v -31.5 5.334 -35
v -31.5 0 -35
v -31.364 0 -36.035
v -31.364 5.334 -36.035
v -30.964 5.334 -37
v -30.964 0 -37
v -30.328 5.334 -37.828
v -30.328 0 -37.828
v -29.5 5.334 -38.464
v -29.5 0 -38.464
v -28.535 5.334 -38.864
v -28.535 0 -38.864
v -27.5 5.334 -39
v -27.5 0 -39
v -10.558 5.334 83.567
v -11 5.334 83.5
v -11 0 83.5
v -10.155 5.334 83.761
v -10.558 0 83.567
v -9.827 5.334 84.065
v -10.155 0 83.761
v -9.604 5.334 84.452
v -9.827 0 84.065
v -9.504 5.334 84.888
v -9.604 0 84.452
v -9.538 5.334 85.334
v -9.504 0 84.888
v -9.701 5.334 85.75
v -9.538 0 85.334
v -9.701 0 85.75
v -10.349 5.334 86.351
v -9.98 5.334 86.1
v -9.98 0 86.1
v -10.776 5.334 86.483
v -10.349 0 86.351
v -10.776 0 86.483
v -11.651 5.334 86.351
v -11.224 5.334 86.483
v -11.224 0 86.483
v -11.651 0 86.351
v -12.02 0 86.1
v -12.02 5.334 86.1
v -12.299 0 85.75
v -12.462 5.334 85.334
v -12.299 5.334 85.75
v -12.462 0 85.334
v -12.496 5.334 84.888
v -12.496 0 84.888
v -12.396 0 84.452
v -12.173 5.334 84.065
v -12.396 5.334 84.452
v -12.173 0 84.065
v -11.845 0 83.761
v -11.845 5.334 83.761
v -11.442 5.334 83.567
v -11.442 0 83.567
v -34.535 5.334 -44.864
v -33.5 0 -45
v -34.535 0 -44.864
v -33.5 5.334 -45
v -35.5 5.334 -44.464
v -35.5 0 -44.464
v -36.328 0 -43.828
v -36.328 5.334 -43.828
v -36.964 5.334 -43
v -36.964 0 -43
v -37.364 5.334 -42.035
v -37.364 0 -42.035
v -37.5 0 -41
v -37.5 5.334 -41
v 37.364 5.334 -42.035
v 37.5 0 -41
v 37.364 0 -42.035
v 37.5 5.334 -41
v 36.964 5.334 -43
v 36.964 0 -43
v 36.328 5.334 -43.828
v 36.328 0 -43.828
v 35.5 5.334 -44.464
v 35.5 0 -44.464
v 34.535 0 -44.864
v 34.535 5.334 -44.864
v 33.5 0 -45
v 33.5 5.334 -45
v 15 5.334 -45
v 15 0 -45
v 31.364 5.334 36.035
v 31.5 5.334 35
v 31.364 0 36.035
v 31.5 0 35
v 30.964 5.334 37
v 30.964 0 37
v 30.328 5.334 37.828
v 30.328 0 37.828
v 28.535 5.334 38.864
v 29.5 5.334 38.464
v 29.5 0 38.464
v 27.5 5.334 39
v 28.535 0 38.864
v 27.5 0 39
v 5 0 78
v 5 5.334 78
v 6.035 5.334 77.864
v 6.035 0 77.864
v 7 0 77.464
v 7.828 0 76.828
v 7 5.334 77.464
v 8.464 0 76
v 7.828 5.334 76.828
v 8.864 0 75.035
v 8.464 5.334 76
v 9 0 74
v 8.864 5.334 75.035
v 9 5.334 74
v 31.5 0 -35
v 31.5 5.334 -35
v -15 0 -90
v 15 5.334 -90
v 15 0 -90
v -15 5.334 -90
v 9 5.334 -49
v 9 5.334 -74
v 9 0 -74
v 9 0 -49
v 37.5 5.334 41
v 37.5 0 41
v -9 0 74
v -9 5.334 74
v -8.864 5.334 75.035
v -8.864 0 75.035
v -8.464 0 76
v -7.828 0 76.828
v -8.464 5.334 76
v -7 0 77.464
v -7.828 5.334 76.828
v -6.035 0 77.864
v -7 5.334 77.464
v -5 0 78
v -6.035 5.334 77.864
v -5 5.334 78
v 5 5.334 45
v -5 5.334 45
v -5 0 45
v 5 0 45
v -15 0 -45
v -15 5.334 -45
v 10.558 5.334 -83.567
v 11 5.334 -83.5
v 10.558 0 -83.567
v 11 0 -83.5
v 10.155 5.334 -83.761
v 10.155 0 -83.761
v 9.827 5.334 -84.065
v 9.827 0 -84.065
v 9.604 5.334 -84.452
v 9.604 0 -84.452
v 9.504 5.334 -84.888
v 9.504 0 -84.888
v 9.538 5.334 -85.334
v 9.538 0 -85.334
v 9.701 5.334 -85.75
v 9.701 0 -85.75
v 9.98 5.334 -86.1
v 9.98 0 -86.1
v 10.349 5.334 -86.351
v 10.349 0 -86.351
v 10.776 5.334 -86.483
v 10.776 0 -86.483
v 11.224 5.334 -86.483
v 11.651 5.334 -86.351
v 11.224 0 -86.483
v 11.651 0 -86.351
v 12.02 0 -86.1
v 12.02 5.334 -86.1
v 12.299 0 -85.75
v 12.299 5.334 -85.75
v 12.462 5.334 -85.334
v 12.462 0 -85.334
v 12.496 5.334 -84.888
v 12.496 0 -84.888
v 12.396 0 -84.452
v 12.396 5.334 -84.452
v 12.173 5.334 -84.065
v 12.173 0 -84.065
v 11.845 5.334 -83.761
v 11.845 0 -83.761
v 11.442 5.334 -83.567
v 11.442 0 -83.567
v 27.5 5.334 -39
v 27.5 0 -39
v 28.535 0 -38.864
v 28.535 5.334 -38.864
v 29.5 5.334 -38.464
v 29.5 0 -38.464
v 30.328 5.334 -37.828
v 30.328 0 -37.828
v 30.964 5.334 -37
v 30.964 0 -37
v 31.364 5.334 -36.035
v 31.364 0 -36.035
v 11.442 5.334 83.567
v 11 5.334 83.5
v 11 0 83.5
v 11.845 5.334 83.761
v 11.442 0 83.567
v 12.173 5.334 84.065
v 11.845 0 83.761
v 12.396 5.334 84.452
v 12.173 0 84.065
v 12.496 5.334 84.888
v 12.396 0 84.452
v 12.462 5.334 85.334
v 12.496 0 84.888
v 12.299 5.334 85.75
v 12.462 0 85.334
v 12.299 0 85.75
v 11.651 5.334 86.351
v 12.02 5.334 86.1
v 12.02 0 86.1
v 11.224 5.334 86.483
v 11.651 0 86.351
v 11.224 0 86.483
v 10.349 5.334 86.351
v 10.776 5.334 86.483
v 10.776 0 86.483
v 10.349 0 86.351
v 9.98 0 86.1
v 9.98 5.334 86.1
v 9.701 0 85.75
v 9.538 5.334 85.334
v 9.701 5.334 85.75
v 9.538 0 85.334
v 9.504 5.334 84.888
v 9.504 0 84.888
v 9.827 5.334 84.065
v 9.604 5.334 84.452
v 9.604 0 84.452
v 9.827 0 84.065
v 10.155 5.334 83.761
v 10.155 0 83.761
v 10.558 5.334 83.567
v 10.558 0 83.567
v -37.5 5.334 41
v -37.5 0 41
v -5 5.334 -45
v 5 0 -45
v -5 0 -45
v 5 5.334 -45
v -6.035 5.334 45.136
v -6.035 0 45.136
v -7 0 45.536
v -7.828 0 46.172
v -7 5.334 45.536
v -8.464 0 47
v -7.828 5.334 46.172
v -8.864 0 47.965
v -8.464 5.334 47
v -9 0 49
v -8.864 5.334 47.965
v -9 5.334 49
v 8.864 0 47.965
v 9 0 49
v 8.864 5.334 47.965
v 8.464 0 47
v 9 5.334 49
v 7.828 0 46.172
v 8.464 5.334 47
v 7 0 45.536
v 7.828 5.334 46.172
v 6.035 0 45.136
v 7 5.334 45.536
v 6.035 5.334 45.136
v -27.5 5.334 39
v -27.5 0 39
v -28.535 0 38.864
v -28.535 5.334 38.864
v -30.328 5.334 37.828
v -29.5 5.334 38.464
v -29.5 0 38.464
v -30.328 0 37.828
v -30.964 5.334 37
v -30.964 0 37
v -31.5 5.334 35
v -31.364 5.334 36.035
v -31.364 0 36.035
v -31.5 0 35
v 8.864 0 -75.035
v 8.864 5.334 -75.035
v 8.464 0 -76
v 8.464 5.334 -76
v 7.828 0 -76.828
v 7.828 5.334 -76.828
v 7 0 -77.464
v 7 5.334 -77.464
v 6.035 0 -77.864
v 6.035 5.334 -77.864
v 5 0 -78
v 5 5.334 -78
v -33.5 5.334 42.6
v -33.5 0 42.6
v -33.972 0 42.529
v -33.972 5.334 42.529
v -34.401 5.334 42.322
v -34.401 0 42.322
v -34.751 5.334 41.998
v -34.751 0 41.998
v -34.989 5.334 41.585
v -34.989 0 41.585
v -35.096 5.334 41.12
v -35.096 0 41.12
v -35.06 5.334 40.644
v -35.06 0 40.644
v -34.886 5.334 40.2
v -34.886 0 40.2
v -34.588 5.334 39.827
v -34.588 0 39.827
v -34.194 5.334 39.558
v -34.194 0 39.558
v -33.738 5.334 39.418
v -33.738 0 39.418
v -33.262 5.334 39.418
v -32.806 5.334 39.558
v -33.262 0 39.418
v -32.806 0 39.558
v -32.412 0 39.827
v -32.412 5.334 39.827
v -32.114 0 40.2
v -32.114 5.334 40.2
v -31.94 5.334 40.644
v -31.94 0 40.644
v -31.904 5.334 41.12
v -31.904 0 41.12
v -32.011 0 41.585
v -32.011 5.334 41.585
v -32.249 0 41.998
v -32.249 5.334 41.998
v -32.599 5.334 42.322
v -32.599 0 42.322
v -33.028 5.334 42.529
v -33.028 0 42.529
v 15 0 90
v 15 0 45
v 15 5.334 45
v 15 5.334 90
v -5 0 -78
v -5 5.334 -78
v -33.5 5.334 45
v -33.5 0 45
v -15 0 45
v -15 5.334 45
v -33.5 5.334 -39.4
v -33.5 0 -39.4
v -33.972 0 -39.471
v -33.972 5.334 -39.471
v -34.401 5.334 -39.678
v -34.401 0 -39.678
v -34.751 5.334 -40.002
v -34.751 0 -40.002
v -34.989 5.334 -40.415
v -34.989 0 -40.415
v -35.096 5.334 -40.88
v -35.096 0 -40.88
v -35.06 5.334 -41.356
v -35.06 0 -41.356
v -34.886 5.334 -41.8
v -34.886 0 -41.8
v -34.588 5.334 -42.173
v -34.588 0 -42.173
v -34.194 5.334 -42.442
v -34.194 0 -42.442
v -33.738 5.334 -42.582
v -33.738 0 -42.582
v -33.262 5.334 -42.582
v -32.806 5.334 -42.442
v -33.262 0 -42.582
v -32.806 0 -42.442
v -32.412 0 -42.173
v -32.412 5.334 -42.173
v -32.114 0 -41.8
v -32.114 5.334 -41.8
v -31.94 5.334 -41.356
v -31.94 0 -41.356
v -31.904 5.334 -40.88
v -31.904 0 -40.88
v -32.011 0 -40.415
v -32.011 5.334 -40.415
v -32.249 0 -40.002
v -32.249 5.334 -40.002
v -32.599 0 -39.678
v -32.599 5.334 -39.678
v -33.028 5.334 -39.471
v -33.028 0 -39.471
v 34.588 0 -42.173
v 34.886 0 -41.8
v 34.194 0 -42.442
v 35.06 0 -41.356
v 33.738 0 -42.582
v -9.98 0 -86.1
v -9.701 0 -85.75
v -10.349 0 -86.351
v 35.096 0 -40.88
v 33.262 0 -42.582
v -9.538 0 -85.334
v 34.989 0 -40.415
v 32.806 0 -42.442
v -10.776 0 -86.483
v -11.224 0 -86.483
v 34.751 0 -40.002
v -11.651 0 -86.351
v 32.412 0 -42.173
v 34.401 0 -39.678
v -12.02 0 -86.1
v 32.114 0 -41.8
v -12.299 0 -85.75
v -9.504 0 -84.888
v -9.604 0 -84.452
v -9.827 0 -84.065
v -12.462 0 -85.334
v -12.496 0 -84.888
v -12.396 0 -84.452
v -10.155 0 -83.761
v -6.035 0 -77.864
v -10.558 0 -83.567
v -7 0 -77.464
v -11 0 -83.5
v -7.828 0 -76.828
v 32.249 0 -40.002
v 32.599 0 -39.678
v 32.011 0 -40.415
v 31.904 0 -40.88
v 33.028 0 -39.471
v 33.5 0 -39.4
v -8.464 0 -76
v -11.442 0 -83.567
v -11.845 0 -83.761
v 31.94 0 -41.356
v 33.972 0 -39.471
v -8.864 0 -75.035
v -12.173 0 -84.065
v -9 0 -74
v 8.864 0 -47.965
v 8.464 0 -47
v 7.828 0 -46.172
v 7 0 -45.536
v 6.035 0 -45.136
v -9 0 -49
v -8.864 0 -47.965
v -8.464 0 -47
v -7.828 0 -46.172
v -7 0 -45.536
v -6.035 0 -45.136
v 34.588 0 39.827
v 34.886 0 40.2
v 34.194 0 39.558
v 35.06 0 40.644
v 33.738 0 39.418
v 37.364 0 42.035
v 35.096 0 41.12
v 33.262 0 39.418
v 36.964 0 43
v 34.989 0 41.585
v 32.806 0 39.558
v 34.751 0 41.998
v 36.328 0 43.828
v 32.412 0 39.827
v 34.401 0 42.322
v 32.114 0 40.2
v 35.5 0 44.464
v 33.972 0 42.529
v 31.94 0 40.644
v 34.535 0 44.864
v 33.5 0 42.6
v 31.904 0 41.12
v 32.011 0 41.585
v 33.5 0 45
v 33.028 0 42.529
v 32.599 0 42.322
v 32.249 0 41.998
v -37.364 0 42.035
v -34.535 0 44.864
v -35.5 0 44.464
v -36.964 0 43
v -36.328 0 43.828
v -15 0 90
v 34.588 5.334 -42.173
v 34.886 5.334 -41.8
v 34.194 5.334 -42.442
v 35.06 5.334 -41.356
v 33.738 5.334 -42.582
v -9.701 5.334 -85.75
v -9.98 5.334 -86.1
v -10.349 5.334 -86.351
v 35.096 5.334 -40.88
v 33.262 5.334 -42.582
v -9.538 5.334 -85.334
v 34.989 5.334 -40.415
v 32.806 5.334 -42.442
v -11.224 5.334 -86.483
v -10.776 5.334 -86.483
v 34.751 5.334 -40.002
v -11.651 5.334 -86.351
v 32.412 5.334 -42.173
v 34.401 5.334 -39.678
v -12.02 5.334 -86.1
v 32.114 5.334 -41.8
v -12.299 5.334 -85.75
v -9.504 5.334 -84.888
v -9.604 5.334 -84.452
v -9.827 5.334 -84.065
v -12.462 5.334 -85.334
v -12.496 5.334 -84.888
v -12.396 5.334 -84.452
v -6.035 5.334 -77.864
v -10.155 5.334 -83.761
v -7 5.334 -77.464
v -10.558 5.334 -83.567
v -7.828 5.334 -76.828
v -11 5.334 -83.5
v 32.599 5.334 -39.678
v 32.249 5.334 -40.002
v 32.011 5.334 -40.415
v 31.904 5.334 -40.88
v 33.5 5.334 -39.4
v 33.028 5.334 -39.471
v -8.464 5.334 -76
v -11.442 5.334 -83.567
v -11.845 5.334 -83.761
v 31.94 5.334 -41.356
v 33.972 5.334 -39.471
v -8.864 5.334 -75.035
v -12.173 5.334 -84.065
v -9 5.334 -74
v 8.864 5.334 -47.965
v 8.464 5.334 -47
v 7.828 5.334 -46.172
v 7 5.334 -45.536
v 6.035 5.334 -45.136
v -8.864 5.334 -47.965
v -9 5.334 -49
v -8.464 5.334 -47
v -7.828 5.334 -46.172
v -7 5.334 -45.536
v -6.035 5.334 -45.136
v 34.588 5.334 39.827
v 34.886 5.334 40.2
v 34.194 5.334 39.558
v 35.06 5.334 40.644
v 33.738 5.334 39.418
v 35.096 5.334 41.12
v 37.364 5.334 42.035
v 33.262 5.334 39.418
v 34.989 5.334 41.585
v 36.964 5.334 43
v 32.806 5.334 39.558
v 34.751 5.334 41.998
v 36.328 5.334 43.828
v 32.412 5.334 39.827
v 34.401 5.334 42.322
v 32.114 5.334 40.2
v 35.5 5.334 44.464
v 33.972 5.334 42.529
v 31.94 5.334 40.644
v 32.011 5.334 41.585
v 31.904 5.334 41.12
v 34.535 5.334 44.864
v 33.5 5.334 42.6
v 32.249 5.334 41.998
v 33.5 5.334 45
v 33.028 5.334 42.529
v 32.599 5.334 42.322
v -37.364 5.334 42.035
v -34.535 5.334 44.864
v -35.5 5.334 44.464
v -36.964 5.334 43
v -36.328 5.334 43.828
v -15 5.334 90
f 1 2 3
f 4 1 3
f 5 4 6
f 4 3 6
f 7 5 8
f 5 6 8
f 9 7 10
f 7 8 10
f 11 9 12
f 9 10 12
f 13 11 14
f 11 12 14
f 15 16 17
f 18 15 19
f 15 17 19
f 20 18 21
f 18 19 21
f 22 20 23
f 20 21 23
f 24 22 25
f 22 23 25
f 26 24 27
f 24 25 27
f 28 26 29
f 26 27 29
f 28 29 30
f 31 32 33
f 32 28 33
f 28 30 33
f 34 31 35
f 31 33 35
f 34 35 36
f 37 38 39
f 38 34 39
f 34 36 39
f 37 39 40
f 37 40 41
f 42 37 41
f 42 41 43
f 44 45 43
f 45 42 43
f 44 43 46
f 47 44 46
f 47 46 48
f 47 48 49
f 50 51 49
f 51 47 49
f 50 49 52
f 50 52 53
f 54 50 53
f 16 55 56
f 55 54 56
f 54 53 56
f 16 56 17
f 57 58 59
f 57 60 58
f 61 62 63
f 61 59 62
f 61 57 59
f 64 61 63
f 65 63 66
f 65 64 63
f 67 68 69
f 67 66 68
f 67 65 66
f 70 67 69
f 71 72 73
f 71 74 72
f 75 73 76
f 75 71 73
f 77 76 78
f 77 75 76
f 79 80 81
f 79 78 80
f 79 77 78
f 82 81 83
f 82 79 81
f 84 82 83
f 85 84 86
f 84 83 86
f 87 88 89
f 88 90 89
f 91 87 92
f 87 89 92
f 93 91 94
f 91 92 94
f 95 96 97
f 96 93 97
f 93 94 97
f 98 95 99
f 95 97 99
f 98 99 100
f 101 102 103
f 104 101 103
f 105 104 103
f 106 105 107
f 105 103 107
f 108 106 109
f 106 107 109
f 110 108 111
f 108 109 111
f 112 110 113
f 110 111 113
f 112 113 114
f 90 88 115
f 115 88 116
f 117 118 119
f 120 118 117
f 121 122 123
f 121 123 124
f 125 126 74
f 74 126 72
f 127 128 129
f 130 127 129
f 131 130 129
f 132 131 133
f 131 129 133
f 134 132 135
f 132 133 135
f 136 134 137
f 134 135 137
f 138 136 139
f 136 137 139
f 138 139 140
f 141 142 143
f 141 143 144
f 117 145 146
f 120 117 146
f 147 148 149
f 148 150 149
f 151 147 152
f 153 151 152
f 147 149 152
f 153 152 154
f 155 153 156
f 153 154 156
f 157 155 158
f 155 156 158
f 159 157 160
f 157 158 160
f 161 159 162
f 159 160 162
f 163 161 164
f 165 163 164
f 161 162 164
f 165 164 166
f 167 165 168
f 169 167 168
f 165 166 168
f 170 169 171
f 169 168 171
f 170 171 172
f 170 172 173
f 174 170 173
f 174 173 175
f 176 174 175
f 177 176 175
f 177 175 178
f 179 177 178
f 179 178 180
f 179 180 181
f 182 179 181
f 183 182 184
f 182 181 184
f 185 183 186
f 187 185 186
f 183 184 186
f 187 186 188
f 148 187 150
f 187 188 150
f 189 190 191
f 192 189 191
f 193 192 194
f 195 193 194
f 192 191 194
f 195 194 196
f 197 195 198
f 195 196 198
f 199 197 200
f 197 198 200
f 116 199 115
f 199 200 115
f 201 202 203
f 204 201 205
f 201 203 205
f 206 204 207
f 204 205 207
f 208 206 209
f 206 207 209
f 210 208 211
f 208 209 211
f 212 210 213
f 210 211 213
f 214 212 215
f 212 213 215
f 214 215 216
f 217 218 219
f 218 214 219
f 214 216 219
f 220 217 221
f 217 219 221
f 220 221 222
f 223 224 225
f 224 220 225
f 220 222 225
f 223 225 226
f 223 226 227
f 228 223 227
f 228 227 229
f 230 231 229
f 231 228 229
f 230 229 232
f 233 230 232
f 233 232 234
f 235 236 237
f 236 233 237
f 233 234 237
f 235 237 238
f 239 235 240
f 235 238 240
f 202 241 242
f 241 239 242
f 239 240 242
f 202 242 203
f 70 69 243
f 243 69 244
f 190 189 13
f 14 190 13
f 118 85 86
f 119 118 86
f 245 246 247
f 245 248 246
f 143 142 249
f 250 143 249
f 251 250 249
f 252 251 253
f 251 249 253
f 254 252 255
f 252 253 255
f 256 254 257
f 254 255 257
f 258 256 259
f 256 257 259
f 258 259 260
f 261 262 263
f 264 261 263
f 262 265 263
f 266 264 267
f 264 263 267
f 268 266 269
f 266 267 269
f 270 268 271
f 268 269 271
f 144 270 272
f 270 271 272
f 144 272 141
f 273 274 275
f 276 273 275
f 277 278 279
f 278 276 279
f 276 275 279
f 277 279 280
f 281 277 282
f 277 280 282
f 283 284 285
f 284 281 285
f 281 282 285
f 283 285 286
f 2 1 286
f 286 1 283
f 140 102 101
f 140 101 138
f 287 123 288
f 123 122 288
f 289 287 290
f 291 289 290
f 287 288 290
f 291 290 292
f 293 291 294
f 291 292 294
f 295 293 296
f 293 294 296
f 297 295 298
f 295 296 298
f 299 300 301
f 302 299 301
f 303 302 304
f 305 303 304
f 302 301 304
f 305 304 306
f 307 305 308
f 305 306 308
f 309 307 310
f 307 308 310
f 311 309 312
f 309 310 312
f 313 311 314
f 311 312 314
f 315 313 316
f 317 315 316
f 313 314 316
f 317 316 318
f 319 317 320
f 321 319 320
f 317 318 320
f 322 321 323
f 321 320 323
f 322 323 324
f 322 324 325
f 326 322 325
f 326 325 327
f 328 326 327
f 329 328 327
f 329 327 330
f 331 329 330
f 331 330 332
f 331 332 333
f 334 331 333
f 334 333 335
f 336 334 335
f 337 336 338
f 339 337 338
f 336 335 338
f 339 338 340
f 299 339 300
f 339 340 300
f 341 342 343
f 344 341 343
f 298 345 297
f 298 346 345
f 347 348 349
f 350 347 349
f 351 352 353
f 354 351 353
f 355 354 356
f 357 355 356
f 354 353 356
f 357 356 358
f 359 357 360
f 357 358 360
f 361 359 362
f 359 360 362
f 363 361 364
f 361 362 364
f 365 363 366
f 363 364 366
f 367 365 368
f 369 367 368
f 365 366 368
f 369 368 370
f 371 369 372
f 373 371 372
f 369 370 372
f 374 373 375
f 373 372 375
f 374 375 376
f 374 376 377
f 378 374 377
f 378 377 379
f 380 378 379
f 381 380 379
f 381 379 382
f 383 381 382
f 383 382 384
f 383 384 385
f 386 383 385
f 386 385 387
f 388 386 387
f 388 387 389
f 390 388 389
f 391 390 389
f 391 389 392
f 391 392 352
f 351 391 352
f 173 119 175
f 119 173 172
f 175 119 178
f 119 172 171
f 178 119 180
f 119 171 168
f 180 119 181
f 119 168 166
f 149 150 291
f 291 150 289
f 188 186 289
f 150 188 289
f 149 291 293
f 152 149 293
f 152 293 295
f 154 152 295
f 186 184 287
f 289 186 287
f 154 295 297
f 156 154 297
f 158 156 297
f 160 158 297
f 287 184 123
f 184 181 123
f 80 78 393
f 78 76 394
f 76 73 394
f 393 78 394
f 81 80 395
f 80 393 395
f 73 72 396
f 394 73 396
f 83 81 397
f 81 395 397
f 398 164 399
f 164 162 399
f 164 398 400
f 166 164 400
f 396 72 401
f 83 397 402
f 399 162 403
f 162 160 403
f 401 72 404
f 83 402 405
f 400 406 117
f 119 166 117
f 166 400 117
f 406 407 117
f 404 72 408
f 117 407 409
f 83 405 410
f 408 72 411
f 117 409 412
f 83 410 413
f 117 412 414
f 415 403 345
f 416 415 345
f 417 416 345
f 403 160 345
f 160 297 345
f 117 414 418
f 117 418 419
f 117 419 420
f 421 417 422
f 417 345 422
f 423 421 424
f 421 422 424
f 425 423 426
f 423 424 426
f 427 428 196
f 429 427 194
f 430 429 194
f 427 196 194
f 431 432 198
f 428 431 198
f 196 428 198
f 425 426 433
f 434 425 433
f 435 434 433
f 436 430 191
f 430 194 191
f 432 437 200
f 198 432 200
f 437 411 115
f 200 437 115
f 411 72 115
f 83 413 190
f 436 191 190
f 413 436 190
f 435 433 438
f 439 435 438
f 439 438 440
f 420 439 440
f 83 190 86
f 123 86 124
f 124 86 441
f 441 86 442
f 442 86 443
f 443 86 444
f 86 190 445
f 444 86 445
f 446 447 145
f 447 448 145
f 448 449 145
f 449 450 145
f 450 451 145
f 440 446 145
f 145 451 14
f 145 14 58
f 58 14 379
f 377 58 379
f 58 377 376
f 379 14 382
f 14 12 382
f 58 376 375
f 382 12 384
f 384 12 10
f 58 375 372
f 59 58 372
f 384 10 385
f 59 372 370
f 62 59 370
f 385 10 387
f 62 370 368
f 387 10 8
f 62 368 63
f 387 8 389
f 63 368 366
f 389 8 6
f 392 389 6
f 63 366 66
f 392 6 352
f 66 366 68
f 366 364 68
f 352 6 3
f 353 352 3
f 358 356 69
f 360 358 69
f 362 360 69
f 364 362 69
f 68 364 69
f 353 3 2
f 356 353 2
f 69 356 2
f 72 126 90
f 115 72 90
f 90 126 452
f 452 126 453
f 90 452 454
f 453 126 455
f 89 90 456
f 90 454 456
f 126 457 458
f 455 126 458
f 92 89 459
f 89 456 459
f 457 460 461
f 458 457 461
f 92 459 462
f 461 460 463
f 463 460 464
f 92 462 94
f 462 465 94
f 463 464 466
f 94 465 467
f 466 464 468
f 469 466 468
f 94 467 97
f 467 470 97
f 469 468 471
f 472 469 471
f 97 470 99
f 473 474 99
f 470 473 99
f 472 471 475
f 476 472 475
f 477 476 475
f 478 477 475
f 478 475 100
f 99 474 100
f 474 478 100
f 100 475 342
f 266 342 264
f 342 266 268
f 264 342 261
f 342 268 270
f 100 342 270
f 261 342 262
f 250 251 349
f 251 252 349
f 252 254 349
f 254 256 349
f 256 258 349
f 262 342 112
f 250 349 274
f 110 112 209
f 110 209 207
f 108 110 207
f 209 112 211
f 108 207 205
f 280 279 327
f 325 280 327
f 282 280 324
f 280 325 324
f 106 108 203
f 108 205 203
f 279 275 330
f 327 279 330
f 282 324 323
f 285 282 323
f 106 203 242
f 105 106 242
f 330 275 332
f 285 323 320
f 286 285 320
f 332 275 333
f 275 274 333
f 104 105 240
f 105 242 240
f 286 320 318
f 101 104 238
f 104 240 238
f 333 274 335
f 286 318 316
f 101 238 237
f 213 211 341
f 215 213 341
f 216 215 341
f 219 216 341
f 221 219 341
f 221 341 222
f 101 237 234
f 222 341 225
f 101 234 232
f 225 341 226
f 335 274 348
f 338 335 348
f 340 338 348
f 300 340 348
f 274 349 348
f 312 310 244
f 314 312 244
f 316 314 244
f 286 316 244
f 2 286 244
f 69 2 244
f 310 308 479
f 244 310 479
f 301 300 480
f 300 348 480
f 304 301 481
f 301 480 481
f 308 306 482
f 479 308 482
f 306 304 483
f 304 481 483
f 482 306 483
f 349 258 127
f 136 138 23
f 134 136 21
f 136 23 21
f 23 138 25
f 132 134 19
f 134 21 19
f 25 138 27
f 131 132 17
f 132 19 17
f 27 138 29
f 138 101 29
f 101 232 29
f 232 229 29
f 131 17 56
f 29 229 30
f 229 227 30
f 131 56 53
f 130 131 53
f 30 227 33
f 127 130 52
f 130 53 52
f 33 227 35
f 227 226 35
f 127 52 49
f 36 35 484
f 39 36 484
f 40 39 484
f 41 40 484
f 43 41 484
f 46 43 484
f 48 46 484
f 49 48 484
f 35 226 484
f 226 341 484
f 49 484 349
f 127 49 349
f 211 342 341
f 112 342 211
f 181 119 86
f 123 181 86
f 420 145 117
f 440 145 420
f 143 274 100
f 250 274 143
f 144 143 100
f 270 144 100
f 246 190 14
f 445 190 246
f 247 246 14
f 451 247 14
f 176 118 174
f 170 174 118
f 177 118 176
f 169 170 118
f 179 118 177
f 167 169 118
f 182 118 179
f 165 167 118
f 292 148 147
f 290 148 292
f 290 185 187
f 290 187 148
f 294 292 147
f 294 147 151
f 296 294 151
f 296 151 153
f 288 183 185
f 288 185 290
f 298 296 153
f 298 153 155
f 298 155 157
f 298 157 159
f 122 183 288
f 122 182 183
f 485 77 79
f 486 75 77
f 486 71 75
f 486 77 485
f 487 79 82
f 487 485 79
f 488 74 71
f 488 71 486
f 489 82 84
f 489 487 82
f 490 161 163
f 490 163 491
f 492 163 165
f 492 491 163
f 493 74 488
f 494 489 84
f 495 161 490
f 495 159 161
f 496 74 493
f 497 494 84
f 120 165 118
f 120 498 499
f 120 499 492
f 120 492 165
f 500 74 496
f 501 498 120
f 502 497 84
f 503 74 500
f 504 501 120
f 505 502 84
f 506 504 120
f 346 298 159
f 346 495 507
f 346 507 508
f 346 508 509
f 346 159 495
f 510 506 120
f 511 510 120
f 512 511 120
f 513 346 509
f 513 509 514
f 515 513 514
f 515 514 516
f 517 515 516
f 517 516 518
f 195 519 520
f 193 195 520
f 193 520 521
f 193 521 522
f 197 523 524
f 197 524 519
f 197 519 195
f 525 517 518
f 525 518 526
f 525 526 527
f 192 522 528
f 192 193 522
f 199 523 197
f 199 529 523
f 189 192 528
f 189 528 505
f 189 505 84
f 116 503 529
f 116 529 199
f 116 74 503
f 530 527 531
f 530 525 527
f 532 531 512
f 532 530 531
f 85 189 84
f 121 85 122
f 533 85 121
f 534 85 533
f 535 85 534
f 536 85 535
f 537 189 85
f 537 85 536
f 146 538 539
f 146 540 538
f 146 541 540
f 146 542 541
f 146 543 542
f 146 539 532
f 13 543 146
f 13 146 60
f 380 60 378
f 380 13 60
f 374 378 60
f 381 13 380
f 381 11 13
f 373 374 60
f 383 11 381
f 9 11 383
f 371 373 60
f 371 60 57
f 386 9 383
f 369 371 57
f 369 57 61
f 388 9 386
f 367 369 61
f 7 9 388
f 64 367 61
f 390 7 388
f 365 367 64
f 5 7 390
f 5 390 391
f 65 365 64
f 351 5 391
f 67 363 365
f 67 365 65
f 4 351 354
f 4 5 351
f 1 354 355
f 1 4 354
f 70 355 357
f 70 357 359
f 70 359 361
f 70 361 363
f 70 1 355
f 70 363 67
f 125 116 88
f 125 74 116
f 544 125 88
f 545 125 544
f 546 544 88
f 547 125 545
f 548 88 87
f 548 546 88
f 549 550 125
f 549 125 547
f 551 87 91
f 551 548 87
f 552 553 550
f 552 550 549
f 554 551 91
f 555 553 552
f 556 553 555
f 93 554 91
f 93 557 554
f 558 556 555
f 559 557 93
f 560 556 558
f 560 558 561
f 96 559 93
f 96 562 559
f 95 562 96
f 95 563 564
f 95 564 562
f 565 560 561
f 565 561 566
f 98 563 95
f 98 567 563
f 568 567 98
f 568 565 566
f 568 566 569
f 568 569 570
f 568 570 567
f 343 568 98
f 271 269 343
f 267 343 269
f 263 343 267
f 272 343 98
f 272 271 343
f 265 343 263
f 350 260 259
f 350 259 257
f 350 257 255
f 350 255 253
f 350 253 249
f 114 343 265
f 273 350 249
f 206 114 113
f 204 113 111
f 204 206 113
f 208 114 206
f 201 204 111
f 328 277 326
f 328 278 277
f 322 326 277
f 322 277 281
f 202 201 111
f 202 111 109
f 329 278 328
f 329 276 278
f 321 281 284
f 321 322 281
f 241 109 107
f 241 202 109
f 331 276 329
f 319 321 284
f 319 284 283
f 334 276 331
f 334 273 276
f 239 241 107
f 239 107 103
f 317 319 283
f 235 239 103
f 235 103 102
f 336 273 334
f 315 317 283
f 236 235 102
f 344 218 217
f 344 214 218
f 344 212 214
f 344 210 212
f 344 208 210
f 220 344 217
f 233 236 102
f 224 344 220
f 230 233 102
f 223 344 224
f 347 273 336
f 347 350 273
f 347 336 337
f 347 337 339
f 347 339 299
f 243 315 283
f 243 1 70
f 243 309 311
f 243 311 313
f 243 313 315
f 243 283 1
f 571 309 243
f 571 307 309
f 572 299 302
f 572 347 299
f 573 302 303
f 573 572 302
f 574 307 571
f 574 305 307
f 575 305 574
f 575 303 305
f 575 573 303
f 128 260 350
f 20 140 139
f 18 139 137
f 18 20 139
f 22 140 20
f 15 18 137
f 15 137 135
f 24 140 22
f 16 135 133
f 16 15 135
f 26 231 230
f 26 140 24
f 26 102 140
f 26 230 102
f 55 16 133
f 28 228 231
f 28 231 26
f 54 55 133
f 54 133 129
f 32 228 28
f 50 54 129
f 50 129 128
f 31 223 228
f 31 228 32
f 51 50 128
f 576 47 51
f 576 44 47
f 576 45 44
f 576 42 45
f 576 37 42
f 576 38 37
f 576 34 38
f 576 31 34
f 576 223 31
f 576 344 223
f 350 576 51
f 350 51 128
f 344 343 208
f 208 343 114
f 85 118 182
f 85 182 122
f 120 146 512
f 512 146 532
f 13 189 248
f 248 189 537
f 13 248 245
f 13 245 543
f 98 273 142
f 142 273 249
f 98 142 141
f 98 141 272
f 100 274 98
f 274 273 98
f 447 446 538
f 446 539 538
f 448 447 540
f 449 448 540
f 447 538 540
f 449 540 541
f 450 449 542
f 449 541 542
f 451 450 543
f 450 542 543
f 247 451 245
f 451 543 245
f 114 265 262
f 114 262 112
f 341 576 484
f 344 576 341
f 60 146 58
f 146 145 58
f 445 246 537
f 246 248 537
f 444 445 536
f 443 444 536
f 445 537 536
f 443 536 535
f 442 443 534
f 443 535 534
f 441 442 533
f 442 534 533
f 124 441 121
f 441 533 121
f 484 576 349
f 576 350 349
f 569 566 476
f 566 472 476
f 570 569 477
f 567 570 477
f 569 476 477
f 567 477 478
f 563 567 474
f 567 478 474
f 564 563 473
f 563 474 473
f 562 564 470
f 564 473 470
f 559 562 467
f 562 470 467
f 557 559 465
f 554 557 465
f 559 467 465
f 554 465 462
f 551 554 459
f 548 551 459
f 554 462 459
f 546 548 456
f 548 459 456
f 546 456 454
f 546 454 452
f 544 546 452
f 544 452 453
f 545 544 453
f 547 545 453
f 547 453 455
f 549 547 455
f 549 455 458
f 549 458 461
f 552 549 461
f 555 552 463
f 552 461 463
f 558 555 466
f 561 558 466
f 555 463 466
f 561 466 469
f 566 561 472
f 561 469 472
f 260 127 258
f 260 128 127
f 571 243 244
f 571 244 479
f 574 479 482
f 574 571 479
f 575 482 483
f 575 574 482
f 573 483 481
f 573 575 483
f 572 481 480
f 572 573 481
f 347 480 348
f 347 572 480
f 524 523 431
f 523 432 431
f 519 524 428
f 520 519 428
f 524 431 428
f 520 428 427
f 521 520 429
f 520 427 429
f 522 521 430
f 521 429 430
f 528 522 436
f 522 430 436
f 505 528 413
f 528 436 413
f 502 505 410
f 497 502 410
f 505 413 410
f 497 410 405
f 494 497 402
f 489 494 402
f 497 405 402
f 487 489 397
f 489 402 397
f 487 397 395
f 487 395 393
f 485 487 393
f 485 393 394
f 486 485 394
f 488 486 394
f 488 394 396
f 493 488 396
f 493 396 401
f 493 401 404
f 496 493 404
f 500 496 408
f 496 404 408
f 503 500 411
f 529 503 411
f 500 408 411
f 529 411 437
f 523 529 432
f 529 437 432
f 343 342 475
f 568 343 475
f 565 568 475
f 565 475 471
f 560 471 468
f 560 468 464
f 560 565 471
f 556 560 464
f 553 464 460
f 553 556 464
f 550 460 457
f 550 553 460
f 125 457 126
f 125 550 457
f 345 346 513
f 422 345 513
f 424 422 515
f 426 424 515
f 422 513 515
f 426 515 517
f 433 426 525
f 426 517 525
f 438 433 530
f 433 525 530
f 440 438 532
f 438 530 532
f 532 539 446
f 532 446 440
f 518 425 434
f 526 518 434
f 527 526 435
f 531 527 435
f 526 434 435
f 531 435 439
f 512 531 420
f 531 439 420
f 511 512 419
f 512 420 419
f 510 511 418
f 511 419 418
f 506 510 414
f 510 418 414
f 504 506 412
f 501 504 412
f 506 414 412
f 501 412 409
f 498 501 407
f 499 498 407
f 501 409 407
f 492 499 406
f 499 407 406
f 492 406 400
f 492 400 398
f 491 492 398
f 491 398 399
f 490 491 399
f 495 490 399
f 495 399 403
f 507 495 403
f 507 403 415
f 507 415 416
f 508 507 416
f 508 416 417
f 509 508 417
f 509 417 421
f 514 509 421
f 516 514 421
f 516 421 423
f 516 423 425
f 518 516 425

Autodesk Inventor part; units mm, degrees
ref_plane "YZ Plane" through (0, 0, 0) normal (1, 0, 0) x (0, 1, 0)
ref_plane "XZ Plane" through (0, 0, 0) normal (0, 1, 0) x (-1, 0, 0)
ref_plane "XY Plane" through (0, 0, 0) normal (0, 0, 1) x (1, 0, 0)
sketch "Sketch1" plane through (0, 0, 0) normal (0, 1, 0) x (-1, 0, 0)
  line L0 (37.5, 45) -> (-37.5, 45)
  line L1 (-37.5, 45) -> (-37.5, -45)
  line L2 (-37.5, -45) -> (37.5, -45)
  line L3 (37.5, -45) -> (37.5, 45)
  point P0 (0, 0)
  point P1 (37.5, 0)
  point P2 (0, 45)
  dimension "d0" = 90
  dimension "d1" = 75
extrude "Extrusion1" add sketch "Sketch1" along normal blind 5.334
sketch "Sketch2" plane through (0, 5.334, 0) normal (0, 1, 0) x (1, 0, 0)
  line L0 (-31.5, -39) -> (31.5, -39)
  line L1 (31.5, -39) -> (31.5, 39)
  line L2 (31.5, 39) -> (-31.5, 39)
  line L3 (-31.5, 39) -> (-31.5, -39)
  line L4 (-37.5, -45) -> (37.5, -45) projected
  line L5 (37.5, 45) -> (-37.5, 45) projected
  line L6 (-37.5, 45) -> (-37.5, -45) projected
  line L7 (37.5, -45) -> (37.5, 45) projected
  point P0 (0, 0)
  dimension "d4" = 6
  dimension "d5" = 6
  dimension "d6" = 6
  dimension "d7" = 6
extrude "Extrusion2" cut sketch "Sketch2" against normal through all contours L3 L2 L1 L0
sketch "Sketch3" plane through (0, 5.334, 0) normal (0, 1, 0) x (1, 0, 0)
  line L0 (-37.5, -45) -> (37.5, -45) projected
  line L1 (-37.5, 45) -> (-37.5, -45) projected
  line L2 (37.5, -45) -> (37.5, 45) projected
  line L3 (37.5, 45) -> (-37.5, 45) projected
  point P0 (0, 0)
  point P1 (-33.5, -41)
  point P2 (-33.5, 41)
  point P3 (33.5, 41)
  point P4 (33.5, -41)
  dimension "d10" = 4
  dimension "d11" = 4
  dimension "d12" = 4
  dimension "d13" = 4
hole "Hole1" at (-33.5, 5.334, 41) at (-33.5, 5.334, -41) at (33.5, 5.334, -41) at (33.5, 5.334, 41) direction (0, -1, 0) diameter 3.2 end through all
fillet "Fillet1" radius 4 8 edges at (-37.5, 2.667, 45) (-31.5, 2.667, 39) (37.5, 2.667, 45) (37.5, 2.667, -45) (31.5, 2.667, -39) (31.5, 2.667, 39) (-31.5, 2.667, -39) (-37.5, 2.667, -45)
sketch "Sketch4" plane through (33.5, 0, -45) normal (0, 0, -1) x (-1, 0, 0)
  line L0 (6, 5.334) -> (61, 5.334) projected
  line L1 (61, 0) -> (6, 0) projected
  line L2 (48.5, 5.334) -> (18.5, 5.334)
  line L3 (18.5, 5.334) -> (18.5, 0)
  line L4 (18.5, 0) -> (48.5, 0)
  line L5 (48.5, 0) -> (48.5, 5.334)
  point P0 (33.5, 0)
  dimension "d22" = 30
  dimension "d23" = 15
extrude "Extrusion3" add sketch "Sketch4" along normal blind 45
sketch "Sketch5" plane through (0, 5.334, 0) normal (0, 1, 0) x (1, 0, 0)
  line L0 (-15, 90) -> (15, 90) projected
  point P0 (0, 0)
  point P1 (-11, 85)
  point P2 (11, 85)
  dimension "d27" = 22
  dimension "d28" = 11
  dimension "d29" = 5
hole "Hole2" at (-11, 5.334, -85) at (11, 5.334, -85) direction (0, -1, 0) diameter 3 end through all
sketch "Sketch7" plane through (0, 5.334, 0) normal (0, 1, 0) x (1, 0, 0)
  line L0 (-5, 78) -> (5, 78)
  line L1 (9, 74) -> (9, 49)
  line L2 (5, 45) -> (-5, 45)
  line L3 (-9, 49) -> (-9, 74)
  arc A0 (-5, 78) -> (-9, 74) centre (-5, 74) ccw
  arc A1 (9, 74) -> (5, 78) centre (5, 74) ccw
  arc A2 (5, 45) -> (9, 49) centre (5, 49) ccw
  arc A3 (-9, 49) -> (-5, 45) centre (-5, 49) ccw
  line L4 (-15, 45) -> (-15, 90) projected
  line L5 (15, 45) -> (15, 90) projected
  line L6 (-15, 90) -> (15, 90) projected
  line L7 (33.5, 45) -> (15, 45) projected
  point P0 (0, 0)
  dimension "d43" = 4
  dimension "d44" = 6
  dimension "d45" = 6
  dimension "d46" = 12
extrude "Extrusion5" cut sketch "Sketch7" against normal through all
mirror "Mirror2" about plane through (0, 0, 0) normal (0, 0, 1) of "Extrusion3", "Extrusion5", "Hole2"
equation "\"d5\" = d4"
equation "\"d6\" = d4"
equation "\"d7\" = d4"
equation "\"d11\" = d10"
equation "\"d12\" = d10"
equation "\"d13\" = d10"
equation "\"d23\" = 0.5 * d22"
equation "\"d28\" = 0.5 * d27"
equation "\"d45\" = d44"
properties part number "phone_plate" material "Polycarbonate, Clear"
